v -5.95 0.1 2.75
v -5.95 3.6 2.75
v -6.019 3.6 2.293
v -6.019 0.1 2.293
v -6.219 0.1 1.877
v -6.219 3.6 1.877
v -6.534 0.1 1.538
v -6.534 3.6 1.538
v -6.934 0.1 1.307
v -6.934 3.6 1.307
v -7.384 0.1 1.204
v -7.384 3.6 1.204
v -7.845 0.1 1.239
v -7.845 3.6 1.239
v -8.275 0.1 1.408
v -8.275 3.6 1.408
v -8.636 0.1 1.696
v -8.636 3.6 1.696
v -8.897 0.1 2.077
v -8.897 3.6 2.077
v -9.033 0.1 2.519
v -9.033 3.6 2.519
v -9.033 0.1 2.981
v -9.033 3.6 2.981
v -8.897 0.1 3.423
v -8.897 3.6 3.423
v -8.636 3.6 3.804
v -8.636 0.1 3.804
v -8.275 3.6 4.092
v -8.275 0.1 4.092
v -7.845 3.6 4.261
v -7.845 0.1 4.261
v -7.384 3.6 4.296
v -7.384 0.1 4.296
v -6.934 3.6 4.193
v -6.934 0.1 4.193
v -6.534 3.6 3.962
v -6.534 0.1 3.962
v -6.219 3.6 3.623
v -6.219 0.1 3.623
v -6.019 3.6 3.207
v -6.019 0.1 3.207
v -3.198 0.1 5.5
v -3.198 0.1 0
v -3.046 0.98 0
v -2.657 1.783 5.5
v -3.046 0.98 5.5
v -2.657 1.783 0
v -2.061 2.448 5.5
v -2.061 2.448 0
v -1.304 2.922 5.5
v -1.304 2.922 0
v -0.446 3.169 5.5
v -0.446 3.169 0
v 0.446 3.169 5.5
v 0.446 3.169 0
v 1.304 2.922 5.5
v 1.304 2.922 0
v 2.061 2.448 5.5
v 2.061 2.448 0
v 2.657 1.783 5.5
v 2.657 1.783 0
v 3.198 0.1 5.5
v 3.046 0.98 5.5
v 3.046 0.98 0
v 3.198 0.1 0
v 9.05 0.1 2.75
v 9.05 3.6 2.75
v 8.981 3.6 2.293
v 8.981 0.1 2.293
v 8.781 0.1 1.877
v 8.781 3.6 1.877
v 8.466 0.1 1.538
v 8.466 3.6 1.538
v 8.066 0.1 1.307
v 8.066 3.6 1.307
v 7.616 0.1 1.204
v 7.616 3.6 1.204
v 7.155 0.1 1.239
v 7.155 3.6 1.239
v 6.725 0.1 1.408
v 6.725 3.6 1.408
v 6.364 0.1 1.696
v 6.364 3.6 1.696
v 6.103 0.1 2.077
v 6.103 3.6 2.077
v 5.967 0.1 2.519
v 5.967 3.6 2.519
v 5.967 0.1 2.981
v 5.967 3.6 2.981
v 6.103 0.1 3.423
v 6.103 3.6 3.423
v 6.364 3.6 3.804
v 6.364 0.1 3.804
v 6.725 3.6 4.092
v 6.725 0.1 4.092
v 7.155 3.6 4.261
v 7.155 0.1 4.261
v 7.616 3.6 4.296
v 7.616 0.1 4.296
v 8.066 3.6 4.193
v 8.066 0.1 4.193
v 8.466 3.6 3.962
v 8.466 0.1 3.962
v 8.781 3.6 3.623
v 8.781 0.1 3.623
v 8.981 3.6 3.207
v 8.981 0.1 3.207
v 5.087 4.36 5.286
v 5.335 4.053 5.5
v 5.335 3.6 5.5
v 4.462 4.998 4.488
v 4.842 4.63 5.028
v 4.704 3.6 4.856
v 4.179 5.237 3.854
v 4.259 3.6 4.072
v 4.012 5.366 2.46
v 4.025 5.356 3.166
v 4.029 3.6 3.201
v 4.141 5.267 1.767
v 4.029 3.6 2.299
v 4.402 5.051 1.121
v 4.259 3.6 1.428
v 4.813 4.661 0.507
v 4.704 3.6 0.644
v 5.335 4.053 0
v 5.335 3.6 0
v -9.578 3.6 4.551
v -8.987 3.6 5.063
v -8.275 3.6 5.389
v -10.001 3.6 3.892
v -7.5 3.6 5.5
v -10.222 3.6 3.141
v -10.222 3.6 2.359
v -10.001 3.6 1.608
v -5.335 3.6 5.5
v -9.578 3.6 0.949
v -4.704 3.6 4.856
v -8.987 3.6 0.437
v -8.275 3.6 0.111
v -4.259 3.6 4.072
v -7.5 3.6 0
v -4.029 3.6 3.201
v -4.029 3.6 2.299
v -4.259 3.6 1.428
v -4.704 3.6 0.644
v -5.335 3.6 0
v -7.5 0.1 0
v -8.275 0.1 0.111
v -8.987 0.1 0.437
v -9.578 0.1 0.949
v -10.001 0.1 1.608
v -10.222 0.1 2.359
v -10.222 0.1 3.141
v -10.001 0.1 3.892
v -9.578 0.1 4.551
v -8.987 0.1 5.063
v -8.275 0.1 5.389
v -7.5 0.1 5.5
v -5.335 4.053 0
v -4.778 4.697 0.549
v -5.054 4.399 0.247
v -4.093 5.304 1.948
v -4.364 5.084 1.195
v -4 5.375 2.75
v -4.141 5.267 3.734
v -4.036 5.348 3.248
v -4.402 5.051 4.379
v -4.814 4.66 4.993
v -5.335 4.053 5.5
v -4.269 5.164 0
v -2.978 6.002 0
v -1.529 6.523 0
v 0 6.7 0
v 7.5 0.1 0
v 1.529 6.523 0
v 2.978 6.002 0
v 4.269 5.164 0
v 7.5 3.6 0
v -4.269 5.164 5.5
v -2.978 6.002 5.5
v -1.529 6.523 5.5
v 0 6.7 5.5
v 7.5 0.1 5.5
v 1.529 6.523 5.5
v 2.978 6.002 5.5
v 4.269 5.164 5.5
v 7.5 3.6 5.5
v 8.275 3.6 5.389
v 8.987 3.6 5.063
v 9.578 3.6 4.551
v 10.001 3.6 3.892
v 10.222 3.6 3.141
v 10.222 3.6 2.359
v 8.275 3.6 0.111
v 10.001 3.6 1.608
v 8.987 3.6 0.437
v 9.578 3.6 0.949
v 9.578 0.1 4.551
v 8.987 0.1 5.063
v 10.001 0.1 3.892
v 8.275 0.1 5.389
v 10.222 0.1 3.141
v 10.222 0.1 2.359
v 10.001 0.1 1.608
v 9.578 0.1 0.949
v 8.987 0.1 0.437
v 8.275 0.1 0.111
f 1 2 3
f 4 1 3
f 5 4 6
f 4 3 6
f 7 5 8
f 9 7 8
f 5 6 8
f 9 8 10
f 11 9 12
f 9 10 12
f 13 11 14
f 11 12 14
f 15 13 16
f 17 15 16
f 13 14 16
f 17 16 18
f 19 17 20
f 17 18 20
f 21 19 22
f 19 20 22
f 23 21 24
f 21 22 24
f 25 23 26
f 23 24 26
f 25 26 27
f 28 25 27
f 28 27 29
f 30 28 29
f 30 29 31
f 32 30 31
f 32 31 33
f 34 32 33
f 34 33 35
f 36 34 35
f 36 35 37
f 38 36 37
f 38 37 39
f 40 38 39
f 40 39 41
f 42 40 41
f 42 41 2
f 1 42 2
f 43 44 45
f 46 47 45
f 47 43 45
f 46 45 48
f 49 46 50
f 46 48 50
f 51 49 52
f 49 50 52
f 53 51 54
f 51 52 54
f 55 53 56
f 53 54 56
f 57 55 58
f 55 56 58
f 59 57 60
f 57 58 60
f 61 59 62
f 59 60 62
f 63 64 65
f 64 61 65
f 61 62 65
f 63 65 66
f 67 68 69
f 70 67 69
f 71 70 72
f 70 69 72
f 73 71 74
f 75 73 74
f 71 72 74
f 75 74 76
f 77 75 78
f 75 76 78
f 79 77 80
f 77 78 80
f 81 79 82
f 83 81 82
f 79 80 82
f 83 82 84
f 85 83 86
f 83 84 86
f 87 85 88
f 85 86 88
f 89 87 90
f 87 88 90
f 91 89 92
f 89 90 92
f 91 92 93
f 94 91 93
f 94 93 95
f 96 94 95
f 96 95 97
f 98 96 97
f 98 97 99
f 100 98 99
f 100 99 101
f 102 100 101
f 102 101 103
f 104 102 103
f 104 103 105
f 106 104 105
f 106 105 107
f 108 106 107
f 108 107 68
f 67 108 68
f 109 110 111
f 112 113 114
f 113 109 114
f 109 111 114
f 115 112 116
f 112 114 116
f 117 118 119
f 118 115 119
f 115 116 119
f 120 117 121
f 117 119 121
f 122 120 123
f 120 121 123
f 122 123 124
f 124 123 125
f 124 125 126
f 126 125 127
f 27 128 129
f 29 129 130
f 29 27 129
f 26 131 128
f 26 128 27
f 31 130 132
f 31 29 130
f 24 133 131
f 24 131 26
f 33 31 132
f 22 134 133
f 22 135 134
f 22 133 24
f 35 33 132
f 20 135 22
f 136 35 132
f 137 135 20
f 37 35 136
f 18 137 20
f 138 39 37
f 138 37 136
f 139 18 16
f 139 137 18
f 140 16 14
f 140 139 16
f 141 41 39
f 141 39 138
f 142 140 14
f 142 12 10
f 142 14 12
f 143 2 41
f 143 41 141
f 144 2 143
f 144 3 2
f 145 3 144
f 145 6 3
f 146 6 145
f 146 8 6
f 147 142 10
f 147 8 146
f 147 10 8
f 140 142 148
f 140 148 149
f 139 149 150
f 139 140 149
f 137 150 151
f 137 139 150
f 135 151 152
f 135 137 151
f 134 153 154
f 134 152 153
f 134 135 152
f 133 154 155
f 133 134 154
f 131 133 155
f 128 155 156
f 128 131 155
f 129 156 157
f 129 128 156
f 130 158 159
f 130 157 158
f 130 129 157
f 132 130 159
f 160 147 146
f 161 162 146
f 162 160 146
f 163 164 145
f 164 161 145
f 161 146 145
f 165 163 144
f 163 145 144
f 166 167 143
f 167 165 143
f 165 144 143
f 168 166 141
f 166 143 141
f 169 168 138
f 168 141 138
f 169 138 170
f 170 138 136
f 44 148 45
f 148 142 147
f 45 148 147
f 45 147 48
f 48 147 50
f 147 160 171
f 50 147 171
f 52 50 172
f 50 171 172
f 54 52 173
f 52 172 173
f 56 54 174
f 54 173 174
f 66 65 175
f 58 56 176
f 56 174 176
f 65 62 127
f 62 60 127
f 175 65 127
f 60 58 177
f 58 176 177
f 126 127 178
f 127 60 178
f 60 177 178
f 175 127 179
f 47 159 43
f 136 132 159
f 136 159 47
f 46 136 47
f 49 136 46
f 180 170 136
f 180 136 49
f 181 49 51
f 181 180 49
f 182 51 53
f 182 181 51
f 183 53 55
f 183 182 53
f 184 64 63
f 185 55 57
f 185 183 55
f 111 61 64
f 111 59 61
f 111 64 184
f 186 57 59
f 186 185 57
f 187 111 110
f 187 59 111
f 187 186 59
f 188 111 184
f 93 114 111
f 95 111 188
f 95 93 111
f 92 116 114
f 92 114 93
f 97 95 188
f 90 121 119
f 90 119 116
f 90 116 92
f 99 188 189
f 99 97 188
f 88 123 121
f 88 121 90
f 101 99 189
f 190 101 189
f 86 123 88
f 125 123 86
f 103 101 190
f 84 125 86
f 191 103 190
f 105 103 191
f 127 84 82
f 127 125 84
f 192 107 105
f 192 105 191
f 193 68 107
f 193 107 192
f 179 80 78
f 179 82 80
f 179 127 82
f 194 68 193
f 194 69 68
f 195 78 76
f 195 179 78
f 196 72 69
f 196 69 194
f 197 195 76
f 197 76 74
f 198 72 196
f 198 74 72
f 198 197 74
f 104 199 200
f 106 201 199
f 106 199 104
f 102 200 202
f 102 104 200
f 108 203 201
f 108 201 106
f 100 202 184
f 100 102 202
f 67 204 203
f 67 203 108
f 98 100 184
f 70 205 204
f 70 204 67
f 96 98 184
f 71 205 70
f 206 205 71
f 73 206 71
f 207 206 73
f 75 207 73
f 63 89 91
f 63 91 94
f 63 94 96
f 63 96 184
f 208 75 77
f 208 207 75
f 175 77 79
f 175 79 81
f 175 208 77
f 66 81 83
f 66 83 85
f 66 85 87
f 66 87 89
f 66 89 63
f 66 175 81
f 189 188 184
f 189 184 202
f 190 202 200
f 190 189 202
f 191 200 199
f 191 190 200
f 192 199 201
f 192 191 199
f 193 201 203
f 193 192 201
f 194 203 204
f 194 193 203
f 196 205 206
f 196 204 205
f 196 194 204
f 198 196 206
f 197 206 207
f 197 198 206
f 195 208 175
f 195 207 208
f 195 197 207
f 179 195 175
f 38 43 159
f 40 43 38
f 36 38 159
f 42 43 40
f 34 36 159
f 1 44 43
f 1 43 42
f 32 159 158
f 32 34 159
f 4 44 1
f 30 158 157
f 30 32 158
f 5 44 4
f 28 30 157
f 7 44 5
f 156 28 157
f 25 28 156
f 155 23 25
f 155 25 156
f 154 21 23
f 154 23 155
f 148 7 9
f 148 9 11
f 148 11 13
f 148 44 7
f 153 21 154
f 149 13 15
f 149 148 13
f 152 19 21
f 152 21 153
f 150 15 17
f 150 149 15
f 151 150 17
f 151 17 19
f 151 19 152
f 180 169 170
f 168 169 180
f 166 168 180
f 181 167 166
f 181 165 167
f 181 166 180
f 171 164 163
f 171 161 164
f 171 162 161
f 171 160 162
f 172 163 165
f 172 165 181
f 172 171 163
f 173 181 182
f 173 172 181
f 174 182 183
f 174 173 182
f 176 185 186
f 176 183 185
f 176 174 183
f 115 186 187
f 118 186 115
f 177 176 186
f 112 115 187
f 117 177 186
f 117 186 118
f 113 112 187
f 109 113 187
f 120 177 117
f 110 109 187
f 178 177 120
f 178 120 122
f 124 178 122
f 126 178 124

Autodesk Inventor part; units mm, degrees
ref_plane "YZ Plane" through (0, 0, 0) normal (1, 0, 0) x (0, 1, 0)
ref_plane "XZ Plane" through (0, 0, 0) normal (0, 1, 0) x (-1, 0, 0)
ref_plane "XY Plane" through (0, 0, 0) normal (0, 0, 1) x (1, 0, 0)
sketch "Sketch1" plane through (0, 0, 0) normal (0, 0, 1) x (1, 0, 0)
  circle A0 centre (0, 0) radius 3.2
  line L0 (-3.1984, 0.1) -> (-10.25, 0.1)
  line L1 (-10.25, 0.1) -> (-10.25, 3.6)
  line L2 (-10.25, 3.6) -> (-5.6507, 3.6)
  arc A1 (5.6507, 3.6) -> (-5.6507, 3.6) centre (0, 0) ccw
  line L3 (5.6507, 3.6) -> (10.25, 3.6)
  line L4 (10.25, 3.6) -> (10.25, 2.7012)
  line L5 (10.25, 2.7012) -> (10.25, 0.1)
  line L6 (10.25, 0.1) -> (6.1992, 0.1)
  line L7 (6.1992, 0.1) -> (3.1984, 0.1)
  dimension "d0" = 6.4
  dimension "d1" = 0.1
  dimension "d2" = 3.5
  dimension "d3" = 3.5
  dimension "d4" = 10.25
  dimension "d5" = 10.25
extrude "Extrusion1" add sketch "Sketch1" along normal blind 5.5 contours A0 L0 L1 L2 A1 L3 L4 L5 L6 L7
sketch "Sketch2" plane through (-10.25, 3.6, 0) normal (0, 1, 0) x (1, 0, 0)
  circle A0 centre (2.75, -2.75) radius 3.5
  circle A1 centre (17.75, -2.75) radius 3.5
  line L0 (0, 0) -> (0, -5.5) projected
  line L1 (20.5, 0) -> (20.5, -5.5) projected
  point P0 (10.25, 0)
  point P1 (0, -2.75)
  dimension "d8" = 15
  dimension "d9" = 2.75
  dimension "d10" = 2.75
  dimension "d11" = 7
extrude "Extrusion2" cut sketch "Sketch2" along normal through all
sketch "Sketch3" plane through (-10.25, 3.6, 5.5) normal (0, 1, 0) x (1, 0, 0)
  arc A0 (4.9151, 0) -> (4.9151, 5.5) centre (2.75, 2.75) ccw projected
  circle A1 centre (2.75, 2.75) radius 1.55
  arc A2 (15.5849, 5.5) -> (15.5849, 0) centre (17.75, 2.75) ccw projected
  circle A3 centre (17.75, 2.75) radius 1.55
  line L0 (4.9151, 5.5) -> (15.5849, 5.5) projected
  line L1 (0, 5.5) -> (0, 0) projected
  line L2 (4.9151, 0) -> (0, 0) projected
  arc A4 (4.9151, 0) -> (4.9151, 5.5) centre (2.75, 2.75) ccw projected
  line L3 (4.9151, 5.5) -> (0, 5.5) projected
  line L4 (20.5, 5.5) -> (20.5, 0) projected
  line L5 (20.5, 5.5) -> (15.5849, 5.5) projected
  arc A5 (15.5849, 5.5) -> (15.5849, 0) centre (17.75, 2.75) ccw projected
  line L6 (20.5, 0) -> (15.5849, 0) projected
  circle A6 centre (17.75, 2.75) radius 2.75
  line L7 (20.5, 5.5) -> (15.5849, 5.5) projected
  circle A7 centre (2.75, 2.75) radius 2.75
  point P0 (10.25, 5.5)
  point P1 (15.5849, 0)
  point P2 (2.75, 0)
  point P3 (0, 2.75)
  point P4 (2.75, 5.5)
  point P5 (20.5, 2.75)
  point P6 (17.75, 0)
  point P7 (17.75, 5.5)
  dimension "d14" = 3.1
extrude "Extrusion3" cut sketch "Sketch3" against normal through all contours L2 L1 A7 | A7 L1 L3 | L5 L4 A6 | A6 L4 L6 | A1 | A3
equation "\"d3\" = d2"
equation "\"d5\" = d4"
equation "\"d9\" = d10"
properties part number "suction_clip_2_top"
